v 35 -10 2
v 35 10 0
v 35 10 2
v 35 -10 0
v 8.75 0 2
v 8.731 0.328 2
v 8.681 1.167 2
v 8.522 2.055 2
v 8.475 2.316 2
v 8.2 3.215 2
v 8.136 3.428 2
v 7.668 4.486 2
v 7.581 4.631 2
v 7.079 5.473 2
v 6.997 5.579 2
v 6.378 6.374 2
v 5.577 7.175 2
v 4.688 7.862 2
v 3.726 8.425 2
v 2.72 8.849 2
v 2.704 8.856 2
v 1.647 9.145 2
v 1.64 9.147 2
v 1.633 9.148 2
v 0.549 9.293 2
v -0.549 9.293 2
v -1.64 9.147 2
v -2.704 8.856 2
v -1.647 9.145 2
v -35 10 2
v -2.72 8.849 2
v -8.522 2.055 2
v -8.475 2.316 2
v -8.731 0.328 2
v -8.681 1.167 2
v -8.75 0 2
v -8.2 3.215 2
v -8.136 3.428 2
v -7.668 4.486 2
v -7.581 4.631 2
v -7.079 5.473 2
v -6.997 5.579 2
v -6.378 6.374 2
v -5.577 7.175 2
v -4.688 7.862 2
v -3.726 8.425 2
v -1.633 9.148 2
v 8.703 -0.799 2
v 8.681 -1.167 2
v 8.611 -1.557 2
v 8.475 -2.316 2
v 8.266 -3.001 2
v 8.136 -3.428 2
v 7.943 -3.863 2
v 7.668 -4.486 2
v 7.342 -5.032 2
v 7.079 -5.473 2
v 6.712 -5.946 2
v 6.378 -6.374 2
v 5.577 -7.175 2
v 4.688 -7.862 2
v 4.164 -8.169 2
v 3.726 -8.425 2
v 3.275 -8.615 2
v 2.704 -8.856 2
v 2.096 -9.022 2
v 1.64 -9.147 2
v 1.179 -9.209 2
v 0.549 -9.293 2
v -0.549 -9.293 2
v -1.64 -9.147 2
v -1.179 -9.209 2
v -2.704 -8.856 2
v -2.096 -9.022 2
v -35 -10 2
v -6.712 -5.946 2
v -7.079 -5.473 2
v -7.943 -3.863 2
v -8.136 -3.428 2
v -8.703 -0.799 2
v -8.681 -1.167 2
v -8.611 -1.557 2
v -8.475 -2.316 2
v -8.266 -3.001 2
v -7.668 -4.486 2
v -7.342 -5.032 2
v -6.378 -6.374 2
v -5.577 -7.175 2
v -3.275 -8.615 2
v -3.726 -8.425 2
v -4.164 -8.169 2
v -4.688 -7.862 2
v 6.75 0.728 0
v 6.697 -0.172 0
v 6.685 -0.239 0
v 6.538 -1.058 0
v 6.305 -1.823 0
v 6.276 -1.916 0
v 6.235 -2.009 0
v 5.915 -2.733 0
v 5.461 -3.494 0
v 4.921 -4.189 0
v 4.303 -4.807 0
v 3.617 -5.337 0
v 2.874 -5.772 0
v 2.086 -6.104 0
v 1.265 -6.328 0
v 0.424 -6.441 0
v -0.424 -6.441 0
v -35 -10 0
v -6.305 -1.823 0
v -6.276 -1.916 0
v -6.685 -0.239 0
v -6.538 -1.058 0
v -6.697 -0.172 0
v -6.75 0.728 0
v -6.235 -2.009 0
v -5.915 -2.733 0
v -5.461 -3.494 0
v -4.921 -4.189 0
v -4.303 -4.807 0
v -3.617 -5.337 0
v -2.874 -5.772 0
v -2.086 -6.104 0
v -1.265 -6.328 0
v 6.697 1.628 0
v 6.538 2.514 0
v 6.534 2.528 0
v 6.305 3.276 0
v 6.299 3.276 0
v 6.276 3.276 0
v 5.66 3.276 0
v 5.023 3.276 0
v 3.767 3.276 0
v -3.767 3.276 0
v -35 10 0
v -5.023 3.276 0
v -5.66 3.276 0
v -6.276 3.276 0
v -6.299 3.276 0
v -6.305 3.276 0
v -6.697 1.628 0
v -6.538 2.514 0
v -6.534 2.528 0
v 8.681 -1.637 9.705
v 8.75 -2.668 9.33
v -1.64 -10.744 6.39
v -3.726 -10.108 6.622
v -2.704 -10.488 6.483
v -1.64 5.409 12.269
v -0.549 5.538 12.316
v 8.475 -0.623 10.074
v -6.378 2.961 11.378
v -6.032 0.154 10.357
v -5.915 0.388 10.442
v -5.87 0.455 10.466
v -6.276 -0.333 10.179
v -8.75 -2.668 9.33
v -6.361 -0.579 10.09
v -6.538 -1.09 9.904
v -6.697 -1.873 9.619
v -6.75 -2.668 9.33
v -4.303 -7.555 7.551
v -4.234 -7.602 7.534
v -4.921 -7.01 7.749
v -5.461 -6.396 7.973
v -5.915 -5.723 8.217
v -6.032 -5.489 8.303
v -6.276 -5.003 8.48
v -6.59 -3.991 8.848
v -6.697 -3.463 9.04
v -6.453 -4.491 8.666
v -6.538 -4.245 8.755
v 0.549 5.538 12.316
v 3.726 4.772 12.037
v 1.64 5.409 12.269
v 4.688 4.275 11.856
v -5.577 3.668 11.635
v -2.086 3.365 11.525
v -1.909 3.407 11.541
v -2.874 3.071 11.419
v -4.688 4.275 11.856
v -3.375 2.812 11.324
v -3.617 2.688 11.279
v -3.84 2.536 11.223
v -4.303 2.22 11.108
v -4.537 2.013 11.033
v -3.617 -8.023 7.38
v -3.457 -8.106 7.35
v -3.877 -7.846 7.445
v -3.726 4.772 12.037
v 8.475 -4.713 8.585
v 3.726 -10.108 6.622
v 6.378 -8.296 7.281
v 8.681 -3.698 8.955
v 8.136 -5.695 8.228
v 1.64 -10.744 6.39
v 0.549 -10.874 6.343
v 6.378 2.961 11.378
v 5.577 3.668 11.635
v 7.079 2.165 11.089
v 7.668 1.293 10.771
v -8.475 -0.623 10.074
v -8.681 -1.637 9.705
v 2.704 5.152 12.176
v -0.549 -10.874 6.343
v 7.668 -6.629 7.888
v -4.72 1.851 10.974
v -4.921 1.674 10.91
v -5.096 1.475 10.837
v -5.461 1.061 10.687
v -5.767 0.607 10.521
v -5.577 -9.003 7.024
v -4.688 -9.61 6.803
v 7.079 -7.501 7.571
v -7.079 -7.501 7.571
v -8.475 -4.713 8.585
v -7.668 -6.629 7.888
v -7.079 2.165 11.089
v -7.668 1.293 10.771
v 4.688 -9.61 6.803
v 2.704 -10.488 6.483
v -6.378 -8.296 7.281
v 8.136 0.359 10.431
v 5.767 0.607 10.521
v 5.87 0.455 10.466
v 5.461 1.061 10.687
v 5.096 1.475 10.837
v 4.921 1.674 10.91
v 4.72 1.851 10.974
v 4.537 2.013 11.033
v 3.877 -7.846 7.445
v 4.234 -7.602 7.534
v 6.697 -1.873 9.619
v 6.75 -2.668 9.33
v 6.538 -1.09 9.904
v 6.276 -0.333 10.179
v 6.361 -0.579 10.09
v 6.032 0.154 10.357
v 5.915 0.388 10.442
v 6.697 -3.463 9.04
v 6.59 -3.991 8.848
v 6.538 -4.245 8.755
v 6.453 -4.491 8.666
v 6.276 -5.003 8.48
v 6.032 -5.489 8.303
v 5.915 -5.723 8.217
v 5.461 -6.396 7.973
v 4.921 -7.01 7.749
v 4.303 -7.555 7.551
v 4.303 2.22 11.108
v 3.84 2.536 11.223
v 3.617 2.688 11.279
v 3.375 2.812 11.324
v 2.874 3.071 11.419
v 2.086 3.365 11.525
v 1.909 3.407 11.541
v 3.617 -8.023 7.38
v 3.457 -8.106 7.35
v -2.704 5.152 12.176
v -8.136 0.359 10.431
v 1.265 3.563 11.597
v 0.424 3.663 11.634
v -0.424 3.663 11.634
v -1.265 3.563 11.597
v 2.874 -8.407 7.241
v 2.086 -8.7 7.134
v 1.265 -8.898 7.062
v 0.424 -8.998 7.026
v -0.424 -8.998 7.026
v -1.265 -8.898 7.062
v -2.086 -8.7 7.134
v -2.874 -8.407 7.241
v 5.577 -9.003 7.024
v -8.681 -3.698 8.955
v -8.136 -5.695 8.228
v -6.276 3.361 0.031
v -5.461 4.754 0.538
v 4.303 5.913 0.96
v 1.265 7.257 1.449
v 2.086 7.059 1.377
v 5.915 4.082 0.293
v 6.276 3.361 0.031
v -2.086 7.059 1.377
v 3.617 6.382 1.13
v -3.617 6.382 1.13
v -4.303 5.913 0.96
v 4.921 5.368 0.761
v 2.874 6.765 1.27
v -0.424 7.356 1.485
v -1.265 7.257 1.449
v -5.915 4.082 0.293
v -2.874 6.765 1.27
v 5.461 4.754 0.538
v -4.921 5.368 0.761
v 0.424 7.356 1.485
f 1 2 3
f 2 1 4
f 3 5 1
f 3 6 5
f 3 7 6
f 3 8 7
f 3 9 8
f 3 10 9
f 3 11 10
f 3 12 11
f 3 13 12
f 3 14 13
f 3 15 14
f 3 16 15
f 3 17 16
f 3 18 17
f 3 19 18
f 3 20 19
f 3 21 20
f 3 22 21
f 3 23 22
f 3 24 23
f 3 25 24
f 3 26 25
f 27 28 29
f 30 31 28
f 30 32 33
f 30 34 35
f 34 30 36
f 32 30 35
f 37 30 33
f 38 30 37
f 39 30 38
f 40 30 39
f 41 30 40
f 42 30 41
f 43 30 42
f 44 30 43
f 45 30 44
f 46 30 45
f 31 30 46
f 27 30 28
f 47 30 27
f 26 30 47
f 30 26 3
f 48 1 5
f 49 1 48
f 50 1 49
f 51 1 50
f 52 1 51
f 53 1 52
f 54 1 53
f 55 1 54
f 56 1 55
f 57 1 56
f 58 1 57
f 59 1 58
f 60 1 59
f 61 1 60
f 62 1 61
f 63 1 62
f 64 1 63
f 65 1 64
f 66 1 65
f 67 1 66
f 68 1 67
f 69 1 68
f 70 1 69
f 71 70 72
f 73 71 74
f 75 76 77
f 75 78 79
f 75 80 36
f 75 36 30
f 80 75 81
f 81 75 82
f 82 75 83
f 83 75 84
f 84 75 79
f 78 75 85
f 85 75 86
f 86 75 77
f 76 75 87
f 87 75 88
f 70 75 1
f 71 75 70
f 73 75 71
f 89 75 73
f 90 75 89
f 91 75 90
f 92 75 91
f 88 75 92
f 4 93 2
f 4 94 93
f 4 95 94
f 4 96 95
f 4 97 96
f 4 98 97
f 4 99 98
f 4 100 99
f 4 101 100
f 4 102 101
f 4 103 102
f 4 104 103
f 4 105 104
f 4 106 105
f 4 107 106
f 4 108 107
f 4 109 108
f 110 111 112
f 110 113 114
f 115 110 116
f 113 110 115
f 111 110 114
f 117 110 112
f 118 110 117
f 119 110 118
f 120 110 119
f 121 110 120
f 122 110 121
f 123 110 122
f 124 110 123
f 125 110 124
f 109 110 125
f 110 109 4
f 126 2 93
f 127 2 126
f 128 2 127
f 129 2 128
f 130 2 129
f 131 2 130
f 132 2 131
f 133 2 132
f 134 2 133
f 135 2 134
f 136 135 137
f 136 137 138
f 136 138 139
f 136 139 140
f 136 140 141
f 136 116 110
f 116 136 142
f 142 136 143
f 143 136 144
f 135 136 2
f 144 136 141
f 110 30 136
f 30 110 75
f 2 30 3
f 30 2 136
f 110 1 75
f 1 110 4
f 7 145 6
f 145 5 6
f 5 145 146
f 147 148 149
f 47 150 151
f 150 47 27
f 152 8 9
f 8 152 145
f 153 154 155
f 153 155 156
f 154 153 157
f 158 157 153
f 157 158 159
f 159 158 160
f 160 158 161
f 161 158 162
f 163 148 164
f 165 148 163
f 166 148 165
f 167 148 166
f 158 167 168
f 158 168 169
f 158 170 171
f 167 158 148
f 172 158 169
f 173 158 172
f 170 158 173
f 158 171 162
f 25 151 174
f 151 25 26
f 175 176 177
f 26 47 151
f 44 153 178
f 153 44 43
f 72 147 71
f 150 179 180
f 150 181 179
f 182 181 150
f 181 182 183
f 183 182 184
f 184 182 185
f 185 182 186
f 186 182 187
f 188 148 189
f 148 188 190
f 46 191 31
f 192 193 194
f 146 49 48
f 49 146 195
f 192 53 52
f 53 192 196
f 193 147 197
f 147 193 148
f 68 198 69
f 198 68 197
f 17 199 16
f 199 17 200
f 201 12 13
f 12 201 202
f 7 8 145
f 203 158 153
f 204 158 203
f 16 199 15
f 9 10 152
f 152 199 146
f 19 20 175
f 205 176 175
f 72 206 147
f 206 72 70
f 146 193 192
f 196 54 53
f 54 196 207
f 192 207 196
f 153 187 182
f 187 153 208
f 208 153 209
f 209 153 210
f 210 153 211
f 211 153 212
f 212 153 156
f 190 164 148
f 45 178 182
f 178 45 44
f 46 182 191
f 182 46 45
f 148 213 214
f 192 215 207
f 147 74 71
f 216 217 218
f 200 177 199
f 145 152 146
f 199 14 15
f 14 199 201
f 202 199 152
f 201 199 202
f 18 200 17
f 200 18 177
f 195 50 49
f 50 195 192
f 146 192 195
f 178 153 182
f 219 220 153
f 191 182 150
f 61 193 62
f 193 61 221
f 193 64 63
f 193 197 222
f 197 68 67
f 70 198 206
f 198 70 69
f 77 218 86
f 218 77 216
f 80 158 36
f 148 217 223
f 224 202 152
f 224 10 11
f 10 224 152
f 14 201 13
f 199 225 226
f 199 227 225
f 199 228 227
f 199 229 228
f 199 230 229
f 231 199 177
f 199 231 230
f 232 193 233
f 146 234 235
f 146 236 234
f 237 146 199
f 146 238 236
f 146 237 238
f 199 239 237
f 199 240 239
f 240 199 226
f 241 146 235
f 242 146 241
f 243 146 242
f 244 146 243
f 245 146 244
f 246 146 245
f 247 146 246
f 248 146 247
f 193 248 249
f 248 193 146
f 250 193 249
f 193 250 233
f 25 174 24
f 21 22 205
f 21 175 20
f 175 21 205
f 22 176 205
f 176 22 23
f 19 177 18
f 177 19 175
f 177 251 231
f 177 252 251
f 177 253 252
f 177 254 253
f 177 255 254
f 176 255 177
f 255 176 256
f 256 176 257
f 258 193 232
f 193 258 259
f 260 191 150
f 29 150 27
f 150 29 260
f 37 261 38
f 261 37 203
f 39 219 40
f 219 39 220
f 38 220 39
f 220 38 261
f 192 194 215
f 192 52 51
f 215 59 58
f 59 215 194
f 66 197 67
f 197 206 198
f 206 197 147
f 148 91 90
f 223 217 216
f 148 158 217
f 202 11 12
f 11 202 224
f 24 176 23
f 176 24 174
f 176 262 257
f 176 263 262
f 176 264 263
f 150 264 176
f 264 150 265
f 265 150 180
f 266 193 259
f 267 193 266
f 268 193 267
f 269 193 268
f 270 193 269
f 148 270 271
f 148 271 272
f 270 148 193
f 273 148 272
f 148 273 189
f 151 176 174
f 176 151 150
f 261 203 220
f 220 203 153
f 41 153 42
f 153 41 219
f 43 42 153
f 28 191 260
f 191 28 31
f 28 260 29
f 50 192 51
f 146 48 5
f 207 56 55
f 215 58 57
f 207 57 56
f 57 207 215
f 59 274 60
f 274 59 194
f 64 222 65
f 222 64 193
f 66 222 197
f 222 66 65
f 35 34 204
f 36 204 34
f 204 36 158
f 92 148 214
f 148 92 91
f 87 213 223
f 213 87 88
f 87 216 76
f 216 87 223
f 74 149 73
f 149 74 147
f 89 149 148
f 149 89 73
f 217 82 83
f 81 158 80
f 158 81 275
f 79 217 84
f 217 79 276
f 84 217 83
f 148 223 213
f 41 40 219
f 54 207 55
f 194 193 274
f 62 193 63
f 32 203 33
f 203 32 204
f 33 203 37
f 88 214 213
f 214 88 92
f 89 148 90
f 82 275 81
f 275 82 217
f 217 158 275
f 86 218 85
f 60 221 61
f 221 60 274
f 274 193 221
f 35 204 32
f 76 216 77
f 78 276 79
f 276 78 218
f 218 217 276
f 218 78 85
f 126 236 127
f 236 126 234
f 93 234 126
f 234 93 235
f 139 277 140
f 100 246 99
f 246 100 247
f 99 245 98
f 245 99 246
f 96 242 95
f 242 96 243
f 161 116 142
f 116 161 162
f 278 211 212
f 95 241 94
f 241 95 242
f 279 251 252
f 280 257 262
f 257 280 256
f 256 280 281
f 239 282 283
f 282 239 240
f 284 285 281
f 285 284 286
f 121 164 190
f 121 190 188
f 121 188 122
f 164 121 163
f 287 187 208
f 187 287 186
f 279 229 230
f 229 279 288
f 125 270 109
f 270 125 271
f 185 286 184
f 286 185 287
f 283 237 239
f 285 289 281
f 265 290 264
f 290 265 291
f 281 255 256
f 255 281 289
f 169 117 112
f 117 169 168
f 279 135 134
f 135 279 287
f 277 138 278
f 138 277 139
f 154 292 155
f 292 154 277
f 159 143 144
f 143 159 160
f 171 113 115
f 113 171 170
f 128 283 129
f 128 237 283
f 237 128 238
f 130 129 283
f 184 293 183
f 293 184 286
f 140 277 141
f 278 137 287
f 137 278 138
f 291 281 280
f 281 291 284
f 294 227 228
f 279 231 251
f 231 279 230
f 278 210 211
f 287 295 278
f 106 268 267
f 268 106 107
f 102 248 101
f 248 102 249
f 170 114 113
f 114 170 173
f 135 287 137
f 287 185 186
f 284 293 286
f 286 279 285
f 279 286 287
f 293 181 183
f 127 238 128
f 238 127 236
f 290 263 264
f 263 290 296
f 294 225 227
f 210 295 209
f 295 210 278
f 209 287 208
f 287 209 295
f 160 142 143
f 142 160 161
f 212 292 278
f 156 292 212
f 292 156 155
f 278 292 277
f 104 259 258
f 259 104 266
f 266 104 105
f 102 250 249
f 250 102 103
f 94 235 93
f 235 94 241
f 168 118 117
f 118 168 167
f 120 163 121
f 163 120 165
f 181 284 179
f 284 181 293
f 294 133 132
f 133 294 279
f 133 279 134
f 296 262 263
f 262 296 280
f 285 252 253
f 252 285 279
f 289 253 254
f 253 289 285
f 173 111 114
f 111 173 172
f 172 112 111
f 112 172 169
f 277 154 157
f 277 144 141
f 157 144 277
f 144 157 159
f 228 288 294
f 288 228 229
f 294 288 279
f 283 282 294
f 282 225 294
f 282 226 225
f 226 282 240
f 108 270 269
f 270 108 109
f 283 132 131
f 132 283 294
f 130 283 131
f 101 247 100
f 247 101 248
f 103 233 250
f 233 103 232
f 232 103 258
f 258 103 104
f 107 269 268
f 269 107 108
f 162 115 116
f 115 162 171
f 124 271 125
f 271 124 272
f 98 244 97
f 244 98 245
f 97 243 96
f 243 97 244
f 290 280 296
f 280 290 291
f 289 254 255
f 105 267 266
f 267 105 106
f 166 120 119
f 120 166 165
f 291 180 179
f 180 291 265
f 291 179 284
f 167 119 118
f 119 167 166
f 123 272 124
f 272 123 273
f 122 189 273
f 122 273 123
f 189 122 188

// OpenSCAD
// Title: Наклонная подставка для веб-камеры
// Description: Пластина с наклонным полым цилиндром по центру
// Author: AI Assistant
// Date: 2024
// License: MIT

/* =====================================================================
 *                         ПАРАМЕТРЫ
 * ===================================================================== */

// --- РАЗМЕРЫ ПЛАСТИНЫ ---
base_length = 70;       // [mm] Длина пластины
base_width = 20;        // [mm] Ширина пластины
base_thickness = 2;     // [mm] Толщина пластины

// --- РАЗМЕРЫ ЦИЛИНДРА ---
inner_diameter = 13.5;  // [mm] Внутренний диаметр
wall_thickness = 2;     // [mm] Толщина стенки
cyl_height = 9;         // [mm] Высота выступающей части цилиндра
tilt_angle = 20;        // [deg] Угол наклона от вертикали

// Автоматический расчет внешнего диаметра
outer_diameter = inner_diameter + (wall_thickness * 2); // 17.5 мм

// --- КАЧЕСТВО ---
$fn = 50;              // Гладкость окружностей

/* =====================================================================
 *                           МОДУЛИ
 * ===================================================================== */

module webcam_mount() {
    difference() {
        // 1. ОБЪЕДИНЕНИЕ (Пластина + Внешний цилиндр)
        union() {
            // Основание (центрируем по X и Y, низ на Z=0)
            translate([-base_length/2, -base_width/2, 0]) {
                cube([base_length, base_width, base_thickness]);
            }
            
            // Внешний цилиндр
            // Поднимаем на уровень верха пластины и наклоняем
            translate([0, 0, base_thickness]) {
                rotate([tilt_angle, 0, 0]) {
                    // Смещаем вниз, чтобы он "врос" в пластину для прочности
                    translate([0, 0, -base_thickness-1.2]) {
                        // Высота = выступ + толщина пластины (чтобы гарантировать слияние)
                        cylinder(h = cyl_height + base_thickness, d = outer_diameter);
                    }
                }
            }
        }

        // 2. ВЫЧИТАНИЕ (Отверстие)
        // Формируем полость внутри цилиндра
        translate([0, 0, base_thickness]) {
            rotate([tilt_angle, 0, 0]) {
                translate([0, 0, -base_thickness - 1]) { // -1 для гарантии прореза
                    cylinder(h = cyl_height + base_thickness + 5, d = inner_diameter);
                }
            }
        }
        
        // 3. ОБРЕЗКА СНИЗУ ("Строго обрезан пластинкой")
        // Отрезаем всё, что могло вылезти ниже Z=0 из-за наклона цилиндра
        translate([0, 0, -50]) {
            cube([100, 100, 100], center=true);
        }
    }
}

/* =====================================================================
 *                        ОСНОВНАЯ СБОРКА
 * ===================================================================== */

webcam_mount();

/* =====================================================================
 *                         ИНФОРМАЦИЯ
 * ===================================================================== 
 * 
 * 📏 Размеры:
 * - Пластина: 70 x 20 x 2 мм
 * - Внешний диаметр цилиндра: 17.5 мм
 * - Внутренний диаметр: 13.5 мм
 * - Высота цилиндра над пластиной: 5 мм
 * - Наклон: 20 градусов (вдоль оси Y/ширины)
 *
 * 🖨️ Рекомендации по печати:
 * - Печатать плашмя (как отображается в предпросмотре).
 * - Поддержки: Скорее всего НЕ требуются (угол 20 градусов от вертикали 
 *   или 70 от горизонтали печатается легко).
 * - Заполнение: 20-50%.
 */
